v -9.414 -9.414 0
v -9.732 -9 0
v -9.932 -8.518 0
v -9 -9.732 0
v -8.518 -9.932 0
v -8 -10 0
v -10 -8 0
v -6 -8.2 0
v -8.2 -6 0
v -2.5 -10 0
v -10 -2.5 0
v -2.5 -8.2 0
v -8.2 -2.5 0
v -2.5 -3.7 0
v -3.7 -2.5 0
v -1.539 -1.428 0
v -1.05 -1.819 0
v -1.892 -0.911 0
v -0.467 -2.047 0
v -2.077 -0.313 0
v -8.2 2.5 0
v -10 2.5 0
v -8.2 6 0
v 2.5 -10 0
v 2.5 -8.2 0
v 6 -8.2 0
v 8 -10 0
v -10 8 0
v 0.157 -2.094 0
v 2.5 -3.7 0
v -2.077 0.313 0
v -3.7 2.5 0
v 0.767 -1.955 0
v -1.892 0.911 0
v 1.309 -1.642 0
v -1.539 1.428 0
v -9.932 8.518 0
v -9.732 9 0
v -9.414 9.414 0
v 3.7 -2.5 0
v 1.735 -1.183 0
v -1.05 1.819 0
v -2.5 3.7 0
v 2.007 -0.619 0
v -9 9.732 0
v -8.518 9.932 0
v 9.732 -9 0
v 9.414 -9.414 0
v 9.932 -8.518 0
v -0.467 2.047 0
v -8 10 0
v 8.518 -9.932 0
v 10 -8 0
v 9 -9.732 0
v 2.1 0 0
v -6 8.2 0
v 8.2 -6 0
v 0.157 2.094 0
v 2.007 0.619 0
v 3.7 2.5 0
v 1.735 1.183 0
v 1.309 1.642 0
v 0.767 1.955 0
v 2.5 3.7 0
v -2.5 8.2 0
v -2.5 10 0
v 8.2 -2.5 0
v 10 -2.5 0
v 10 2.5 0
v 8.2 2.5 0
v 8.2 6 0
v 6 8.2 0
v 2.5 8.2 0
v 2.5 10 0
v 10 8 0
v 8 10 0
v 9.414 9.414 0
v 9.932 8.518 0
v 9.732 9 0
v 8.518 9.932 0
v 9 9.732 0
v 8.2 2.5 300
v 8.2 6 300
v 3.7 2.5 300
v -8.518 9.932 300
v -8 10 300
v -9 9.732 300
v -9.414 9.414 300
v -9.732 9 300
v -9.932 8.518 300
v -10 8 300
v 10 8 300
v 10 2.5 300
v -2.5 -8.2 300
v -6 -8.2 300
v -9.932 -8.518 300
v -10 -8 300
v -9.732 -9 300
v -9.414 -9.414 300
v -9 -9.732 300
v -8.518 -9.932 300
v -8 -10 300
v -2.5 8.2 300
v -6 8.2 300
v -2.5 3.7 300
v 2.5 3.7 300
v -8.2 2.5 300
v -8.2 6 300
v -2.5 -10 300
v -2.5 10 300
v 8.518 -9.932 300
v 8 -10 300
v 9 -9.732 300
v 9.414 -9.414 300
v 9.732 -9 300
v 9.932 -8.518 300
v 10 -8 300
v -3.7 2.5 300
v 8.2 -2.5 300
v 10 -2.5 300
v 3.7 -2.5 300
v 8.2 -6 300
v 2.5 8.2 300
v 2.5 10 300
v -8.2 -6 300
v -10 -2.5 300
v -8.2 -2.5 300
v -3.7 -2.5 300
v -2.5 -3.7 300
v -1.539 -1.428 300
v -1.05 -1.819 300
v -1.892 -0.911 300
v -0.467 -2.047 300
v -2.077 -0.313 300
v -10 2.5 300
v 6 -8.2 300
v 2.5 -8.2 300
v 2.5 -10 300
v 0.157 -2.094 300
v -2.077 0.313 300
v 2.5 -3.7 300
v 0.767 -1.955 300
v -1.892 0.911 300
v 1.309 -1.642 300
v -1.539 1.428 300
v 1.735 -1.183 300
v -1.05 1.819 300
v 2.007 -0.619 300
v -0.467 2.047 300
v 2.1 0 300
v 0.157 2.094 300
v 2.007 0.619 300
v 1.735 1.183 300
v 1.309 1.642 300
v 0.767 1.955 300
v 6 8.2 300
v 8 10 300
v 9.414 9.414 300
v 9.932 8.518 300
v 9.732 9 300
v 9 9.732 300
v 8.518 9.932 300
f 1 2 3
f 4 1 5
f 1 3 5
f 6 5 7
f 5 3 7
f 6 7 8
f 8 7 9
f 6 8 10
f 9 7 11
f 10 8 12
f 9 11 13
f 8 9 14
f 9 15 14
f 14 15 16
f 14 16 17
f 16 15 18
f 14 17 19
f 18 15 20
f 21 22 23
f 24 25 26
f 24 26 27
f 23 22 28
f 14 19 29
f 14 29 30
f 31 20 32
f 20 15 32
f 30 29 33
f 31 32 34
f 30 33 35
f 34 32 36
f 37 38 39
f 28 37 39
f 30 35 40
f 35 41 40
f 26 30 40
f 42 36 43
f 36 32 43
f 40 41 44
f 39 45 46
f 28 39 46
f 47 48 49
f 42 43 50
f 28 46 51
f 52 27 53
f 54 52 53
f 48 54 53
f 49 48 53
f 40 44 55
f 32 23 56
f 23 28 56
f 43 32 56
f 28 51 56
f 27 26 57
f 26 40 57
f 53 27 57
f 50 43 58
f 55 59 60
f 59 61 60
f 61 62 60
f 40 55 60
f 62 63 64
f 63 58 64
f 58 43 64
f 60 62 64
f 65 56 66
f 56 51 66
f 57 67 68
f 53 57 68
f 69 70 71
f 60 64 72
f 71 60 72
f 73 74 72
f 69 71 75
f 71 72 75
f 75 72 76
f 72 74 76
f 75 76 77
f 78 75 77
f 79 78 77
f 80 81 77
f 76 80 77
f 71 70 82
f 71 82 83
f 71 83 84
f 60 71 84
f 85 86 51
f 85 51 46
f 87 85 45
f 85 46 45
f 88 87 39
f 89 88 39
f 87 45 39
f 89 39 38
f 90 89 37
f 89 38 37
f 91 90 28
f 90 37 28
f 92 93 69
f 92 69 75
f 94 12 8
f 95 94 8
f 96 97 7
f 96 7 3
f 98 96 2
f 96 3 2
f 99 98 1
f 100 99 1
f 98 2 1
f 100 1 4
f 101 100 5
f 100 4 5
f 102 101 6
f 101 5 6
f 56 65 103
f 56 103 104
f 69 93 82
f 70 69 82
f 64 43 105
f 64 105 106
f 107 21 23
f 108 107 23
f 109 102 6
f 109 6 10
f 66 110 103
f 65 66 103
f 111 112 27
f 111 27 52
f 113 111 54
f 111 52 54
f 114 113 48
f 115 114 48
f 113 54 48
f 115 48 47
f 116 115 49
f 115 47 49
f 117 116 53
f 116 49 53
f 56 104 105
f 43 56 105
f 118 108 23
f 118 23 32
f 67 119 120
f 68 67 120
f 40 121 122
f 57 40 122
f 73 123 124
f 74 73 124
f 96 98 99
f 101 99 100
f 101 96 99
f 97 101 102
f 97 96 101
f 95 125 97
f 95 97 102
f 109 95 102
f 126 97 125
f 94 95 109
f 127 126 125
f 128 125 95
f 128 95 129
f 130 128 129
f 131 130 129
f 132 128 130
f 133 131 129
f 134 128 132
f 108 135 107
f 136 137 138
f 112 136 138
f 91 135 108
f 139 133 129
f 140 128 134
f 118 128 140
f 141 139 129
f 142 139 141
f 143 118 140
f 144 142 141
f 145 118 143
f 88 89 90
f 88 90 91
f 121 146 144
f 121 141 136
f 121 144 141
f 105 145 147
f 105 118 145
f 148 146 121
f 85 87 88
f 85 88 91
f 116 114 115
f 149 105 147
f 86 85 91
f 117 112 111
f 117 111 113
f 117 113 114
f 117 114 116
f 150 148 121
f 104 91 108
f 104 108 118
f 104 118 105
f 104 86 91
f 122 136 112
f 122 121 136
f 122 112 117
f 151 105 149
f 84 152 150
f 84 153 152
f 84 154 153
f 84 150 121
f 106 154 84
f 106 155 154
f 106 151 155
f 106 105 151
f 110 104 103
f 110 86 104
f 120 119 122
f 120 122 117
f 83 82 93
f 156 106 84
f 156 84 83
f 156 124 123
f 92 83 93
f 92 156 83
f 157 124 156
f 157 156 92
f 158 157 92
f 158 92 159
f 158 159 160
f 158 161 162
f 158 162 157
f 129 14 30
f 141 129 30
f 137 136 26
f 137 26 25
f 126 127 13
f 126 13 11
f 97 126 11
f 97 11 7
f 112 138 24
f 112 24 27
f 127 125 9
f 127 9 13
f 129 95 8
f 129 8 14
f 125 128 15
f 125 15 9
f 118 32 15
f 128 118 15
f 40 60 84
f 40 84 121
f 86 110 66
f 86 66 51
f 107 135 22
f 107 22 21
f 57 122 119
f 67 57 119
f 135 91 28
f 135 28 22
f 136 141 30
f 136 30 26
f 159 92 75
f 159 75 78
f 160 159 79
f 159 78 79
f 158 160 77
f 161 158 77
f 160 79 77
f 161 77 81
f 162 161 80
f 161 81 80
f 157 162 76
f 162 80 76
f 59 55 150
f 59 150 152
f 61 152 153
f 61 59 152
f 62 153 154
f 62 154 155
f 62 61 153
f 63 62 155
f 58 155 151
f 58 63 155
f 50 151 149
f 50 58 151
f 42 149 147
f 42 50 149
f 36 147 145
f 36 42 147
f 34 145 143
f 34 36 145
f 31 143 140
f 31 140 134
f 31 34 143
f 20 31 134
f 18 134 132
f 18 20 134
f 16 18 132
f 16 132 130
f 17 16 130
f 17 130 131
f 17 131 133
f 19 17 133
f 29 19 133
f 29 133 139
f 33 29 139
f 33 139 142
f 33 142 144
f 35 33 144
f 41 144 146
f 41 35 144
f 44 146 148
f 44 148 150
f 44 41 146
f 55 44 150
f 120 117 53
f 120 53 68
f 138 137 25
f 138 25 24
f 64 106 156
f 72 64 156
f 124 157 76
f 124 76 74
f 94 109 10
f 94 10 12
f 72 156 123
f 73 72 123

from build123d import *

# Parameters (mm, degrees)
EXTRUSION1_DEPTH        = 300
PER_AGE1_OUTLINE_R      = 2.1
PER_AGE1_DEPTH          = 300
ENL_V_MAT_EXTRU_1_DEPTH = 300
ENL_V_MAT_EXTRU_3_DEPTH = 300
ENL_V_MAT_EXTRU_4_DEPTH = 301.333148354
ENL_V_MAT_EXTRU_7_DEPTH = 301.333148354


# Read off the part's stored shape, not the designer's step: Perçage1
with BuildPart() as part:
    # Esquisse1 → Extrusion1 (new body)
    with BuildSketch(Plane.XY):
        with BuildLine():
            Line((-10, 8), (-10, -8))
            ThreePointArc((-10, -8), (-9.414213562, -9.414213562), (-8, -10))
            Line((-8, -10), (8, -10))
            ThreePointArc((8, -10), (9.414213562, -9.414213562), (10, -8))
            Line((10, -8), (10, 8))
            ThreePointArc((10, 8), (9.414213562, 9.414213562), (8, 10))
            Line((8, 10), (-8, 10))
            ThreePointArc((-8, 10), (-9.414213562, 9.414213562), (-10, 8))
        make_face()
    extrude(amount=EXTRUSION1_DEPTH)

    # Perçage1 outline → Perçage1 (cut)
    with BuildSketch(Plane.XY):
        Circle(PER_AGE1_OUTLINE_R)
    extrude(amount=PER_AGE1_DEPTH, mode=Mode.SUBTRACT)

    # Esquisse3 → Enlèv. mat.-Extru.1 (cut)
    with BuildSketch(Plane.XY.offset(300)):
        Polygon((10, 2.5), (8.2, 2.5), (8.2, 6), (3.7, 2.5), (3.7, -2.5), (8.2, -6), (8.2, -2.5), (10, -2.5), align=None)
    extrude(amount=-ENL_V_MAT_EXTRU_1_DEPTH, mode=Mode.SUBTRACT)

    # Esquisse5 → Enlèv. mat.-Extru.3 (cut)
    with BuildSketch(Plane.XY.offset(300)):
        Polygon((-2.5, 10), (-2.5, 8.2), (-6, 8.2), (-2.5, 3.7), (2.5, 3.7), (6, 8.2), (2.5, 8.2), (2.5, 10), align=None)
    extrude(amount=-ENL_V_MAT_EXTRU_3_DEPTH, mode=Mode.SUBTRACT)

    # Esquisse6 → Enlèv. mat.-Extru.4 (cut, through all)
    with BuildSketch(Plane.XY.offset(300)):
        Polygon((-2.5, -10), (-2.5, -8.2), (-6, -8.2), (-2.5, -3.7), (2.5, -3.7), (6, -8.2), (2.5, -8.2), (2.5, -10), align=None)
    extrude(amount=-ENL_V_MAT_EXTRU_4_DEPTH, mode=Mode.SUBTRACT)

    # Esquisse4 → Enlèv. mat.-Extru.7 (cut, through all)
    with BuildSketch(Plane.XY.offset(300)):
        Polygon((-10, 2.5), (-8.2, 2.5), (-8.2, 6), (-3.7, 2.5), (-3.7, -2.5), (-8.2, -6), (-8.2, -2.5), (-10, -2.5), align=None)
    extrude(amount=-ENL_V_MAT_EXTRU_7_DEPTH, mode=Mode.SUBTRACT)


solid = part.part
